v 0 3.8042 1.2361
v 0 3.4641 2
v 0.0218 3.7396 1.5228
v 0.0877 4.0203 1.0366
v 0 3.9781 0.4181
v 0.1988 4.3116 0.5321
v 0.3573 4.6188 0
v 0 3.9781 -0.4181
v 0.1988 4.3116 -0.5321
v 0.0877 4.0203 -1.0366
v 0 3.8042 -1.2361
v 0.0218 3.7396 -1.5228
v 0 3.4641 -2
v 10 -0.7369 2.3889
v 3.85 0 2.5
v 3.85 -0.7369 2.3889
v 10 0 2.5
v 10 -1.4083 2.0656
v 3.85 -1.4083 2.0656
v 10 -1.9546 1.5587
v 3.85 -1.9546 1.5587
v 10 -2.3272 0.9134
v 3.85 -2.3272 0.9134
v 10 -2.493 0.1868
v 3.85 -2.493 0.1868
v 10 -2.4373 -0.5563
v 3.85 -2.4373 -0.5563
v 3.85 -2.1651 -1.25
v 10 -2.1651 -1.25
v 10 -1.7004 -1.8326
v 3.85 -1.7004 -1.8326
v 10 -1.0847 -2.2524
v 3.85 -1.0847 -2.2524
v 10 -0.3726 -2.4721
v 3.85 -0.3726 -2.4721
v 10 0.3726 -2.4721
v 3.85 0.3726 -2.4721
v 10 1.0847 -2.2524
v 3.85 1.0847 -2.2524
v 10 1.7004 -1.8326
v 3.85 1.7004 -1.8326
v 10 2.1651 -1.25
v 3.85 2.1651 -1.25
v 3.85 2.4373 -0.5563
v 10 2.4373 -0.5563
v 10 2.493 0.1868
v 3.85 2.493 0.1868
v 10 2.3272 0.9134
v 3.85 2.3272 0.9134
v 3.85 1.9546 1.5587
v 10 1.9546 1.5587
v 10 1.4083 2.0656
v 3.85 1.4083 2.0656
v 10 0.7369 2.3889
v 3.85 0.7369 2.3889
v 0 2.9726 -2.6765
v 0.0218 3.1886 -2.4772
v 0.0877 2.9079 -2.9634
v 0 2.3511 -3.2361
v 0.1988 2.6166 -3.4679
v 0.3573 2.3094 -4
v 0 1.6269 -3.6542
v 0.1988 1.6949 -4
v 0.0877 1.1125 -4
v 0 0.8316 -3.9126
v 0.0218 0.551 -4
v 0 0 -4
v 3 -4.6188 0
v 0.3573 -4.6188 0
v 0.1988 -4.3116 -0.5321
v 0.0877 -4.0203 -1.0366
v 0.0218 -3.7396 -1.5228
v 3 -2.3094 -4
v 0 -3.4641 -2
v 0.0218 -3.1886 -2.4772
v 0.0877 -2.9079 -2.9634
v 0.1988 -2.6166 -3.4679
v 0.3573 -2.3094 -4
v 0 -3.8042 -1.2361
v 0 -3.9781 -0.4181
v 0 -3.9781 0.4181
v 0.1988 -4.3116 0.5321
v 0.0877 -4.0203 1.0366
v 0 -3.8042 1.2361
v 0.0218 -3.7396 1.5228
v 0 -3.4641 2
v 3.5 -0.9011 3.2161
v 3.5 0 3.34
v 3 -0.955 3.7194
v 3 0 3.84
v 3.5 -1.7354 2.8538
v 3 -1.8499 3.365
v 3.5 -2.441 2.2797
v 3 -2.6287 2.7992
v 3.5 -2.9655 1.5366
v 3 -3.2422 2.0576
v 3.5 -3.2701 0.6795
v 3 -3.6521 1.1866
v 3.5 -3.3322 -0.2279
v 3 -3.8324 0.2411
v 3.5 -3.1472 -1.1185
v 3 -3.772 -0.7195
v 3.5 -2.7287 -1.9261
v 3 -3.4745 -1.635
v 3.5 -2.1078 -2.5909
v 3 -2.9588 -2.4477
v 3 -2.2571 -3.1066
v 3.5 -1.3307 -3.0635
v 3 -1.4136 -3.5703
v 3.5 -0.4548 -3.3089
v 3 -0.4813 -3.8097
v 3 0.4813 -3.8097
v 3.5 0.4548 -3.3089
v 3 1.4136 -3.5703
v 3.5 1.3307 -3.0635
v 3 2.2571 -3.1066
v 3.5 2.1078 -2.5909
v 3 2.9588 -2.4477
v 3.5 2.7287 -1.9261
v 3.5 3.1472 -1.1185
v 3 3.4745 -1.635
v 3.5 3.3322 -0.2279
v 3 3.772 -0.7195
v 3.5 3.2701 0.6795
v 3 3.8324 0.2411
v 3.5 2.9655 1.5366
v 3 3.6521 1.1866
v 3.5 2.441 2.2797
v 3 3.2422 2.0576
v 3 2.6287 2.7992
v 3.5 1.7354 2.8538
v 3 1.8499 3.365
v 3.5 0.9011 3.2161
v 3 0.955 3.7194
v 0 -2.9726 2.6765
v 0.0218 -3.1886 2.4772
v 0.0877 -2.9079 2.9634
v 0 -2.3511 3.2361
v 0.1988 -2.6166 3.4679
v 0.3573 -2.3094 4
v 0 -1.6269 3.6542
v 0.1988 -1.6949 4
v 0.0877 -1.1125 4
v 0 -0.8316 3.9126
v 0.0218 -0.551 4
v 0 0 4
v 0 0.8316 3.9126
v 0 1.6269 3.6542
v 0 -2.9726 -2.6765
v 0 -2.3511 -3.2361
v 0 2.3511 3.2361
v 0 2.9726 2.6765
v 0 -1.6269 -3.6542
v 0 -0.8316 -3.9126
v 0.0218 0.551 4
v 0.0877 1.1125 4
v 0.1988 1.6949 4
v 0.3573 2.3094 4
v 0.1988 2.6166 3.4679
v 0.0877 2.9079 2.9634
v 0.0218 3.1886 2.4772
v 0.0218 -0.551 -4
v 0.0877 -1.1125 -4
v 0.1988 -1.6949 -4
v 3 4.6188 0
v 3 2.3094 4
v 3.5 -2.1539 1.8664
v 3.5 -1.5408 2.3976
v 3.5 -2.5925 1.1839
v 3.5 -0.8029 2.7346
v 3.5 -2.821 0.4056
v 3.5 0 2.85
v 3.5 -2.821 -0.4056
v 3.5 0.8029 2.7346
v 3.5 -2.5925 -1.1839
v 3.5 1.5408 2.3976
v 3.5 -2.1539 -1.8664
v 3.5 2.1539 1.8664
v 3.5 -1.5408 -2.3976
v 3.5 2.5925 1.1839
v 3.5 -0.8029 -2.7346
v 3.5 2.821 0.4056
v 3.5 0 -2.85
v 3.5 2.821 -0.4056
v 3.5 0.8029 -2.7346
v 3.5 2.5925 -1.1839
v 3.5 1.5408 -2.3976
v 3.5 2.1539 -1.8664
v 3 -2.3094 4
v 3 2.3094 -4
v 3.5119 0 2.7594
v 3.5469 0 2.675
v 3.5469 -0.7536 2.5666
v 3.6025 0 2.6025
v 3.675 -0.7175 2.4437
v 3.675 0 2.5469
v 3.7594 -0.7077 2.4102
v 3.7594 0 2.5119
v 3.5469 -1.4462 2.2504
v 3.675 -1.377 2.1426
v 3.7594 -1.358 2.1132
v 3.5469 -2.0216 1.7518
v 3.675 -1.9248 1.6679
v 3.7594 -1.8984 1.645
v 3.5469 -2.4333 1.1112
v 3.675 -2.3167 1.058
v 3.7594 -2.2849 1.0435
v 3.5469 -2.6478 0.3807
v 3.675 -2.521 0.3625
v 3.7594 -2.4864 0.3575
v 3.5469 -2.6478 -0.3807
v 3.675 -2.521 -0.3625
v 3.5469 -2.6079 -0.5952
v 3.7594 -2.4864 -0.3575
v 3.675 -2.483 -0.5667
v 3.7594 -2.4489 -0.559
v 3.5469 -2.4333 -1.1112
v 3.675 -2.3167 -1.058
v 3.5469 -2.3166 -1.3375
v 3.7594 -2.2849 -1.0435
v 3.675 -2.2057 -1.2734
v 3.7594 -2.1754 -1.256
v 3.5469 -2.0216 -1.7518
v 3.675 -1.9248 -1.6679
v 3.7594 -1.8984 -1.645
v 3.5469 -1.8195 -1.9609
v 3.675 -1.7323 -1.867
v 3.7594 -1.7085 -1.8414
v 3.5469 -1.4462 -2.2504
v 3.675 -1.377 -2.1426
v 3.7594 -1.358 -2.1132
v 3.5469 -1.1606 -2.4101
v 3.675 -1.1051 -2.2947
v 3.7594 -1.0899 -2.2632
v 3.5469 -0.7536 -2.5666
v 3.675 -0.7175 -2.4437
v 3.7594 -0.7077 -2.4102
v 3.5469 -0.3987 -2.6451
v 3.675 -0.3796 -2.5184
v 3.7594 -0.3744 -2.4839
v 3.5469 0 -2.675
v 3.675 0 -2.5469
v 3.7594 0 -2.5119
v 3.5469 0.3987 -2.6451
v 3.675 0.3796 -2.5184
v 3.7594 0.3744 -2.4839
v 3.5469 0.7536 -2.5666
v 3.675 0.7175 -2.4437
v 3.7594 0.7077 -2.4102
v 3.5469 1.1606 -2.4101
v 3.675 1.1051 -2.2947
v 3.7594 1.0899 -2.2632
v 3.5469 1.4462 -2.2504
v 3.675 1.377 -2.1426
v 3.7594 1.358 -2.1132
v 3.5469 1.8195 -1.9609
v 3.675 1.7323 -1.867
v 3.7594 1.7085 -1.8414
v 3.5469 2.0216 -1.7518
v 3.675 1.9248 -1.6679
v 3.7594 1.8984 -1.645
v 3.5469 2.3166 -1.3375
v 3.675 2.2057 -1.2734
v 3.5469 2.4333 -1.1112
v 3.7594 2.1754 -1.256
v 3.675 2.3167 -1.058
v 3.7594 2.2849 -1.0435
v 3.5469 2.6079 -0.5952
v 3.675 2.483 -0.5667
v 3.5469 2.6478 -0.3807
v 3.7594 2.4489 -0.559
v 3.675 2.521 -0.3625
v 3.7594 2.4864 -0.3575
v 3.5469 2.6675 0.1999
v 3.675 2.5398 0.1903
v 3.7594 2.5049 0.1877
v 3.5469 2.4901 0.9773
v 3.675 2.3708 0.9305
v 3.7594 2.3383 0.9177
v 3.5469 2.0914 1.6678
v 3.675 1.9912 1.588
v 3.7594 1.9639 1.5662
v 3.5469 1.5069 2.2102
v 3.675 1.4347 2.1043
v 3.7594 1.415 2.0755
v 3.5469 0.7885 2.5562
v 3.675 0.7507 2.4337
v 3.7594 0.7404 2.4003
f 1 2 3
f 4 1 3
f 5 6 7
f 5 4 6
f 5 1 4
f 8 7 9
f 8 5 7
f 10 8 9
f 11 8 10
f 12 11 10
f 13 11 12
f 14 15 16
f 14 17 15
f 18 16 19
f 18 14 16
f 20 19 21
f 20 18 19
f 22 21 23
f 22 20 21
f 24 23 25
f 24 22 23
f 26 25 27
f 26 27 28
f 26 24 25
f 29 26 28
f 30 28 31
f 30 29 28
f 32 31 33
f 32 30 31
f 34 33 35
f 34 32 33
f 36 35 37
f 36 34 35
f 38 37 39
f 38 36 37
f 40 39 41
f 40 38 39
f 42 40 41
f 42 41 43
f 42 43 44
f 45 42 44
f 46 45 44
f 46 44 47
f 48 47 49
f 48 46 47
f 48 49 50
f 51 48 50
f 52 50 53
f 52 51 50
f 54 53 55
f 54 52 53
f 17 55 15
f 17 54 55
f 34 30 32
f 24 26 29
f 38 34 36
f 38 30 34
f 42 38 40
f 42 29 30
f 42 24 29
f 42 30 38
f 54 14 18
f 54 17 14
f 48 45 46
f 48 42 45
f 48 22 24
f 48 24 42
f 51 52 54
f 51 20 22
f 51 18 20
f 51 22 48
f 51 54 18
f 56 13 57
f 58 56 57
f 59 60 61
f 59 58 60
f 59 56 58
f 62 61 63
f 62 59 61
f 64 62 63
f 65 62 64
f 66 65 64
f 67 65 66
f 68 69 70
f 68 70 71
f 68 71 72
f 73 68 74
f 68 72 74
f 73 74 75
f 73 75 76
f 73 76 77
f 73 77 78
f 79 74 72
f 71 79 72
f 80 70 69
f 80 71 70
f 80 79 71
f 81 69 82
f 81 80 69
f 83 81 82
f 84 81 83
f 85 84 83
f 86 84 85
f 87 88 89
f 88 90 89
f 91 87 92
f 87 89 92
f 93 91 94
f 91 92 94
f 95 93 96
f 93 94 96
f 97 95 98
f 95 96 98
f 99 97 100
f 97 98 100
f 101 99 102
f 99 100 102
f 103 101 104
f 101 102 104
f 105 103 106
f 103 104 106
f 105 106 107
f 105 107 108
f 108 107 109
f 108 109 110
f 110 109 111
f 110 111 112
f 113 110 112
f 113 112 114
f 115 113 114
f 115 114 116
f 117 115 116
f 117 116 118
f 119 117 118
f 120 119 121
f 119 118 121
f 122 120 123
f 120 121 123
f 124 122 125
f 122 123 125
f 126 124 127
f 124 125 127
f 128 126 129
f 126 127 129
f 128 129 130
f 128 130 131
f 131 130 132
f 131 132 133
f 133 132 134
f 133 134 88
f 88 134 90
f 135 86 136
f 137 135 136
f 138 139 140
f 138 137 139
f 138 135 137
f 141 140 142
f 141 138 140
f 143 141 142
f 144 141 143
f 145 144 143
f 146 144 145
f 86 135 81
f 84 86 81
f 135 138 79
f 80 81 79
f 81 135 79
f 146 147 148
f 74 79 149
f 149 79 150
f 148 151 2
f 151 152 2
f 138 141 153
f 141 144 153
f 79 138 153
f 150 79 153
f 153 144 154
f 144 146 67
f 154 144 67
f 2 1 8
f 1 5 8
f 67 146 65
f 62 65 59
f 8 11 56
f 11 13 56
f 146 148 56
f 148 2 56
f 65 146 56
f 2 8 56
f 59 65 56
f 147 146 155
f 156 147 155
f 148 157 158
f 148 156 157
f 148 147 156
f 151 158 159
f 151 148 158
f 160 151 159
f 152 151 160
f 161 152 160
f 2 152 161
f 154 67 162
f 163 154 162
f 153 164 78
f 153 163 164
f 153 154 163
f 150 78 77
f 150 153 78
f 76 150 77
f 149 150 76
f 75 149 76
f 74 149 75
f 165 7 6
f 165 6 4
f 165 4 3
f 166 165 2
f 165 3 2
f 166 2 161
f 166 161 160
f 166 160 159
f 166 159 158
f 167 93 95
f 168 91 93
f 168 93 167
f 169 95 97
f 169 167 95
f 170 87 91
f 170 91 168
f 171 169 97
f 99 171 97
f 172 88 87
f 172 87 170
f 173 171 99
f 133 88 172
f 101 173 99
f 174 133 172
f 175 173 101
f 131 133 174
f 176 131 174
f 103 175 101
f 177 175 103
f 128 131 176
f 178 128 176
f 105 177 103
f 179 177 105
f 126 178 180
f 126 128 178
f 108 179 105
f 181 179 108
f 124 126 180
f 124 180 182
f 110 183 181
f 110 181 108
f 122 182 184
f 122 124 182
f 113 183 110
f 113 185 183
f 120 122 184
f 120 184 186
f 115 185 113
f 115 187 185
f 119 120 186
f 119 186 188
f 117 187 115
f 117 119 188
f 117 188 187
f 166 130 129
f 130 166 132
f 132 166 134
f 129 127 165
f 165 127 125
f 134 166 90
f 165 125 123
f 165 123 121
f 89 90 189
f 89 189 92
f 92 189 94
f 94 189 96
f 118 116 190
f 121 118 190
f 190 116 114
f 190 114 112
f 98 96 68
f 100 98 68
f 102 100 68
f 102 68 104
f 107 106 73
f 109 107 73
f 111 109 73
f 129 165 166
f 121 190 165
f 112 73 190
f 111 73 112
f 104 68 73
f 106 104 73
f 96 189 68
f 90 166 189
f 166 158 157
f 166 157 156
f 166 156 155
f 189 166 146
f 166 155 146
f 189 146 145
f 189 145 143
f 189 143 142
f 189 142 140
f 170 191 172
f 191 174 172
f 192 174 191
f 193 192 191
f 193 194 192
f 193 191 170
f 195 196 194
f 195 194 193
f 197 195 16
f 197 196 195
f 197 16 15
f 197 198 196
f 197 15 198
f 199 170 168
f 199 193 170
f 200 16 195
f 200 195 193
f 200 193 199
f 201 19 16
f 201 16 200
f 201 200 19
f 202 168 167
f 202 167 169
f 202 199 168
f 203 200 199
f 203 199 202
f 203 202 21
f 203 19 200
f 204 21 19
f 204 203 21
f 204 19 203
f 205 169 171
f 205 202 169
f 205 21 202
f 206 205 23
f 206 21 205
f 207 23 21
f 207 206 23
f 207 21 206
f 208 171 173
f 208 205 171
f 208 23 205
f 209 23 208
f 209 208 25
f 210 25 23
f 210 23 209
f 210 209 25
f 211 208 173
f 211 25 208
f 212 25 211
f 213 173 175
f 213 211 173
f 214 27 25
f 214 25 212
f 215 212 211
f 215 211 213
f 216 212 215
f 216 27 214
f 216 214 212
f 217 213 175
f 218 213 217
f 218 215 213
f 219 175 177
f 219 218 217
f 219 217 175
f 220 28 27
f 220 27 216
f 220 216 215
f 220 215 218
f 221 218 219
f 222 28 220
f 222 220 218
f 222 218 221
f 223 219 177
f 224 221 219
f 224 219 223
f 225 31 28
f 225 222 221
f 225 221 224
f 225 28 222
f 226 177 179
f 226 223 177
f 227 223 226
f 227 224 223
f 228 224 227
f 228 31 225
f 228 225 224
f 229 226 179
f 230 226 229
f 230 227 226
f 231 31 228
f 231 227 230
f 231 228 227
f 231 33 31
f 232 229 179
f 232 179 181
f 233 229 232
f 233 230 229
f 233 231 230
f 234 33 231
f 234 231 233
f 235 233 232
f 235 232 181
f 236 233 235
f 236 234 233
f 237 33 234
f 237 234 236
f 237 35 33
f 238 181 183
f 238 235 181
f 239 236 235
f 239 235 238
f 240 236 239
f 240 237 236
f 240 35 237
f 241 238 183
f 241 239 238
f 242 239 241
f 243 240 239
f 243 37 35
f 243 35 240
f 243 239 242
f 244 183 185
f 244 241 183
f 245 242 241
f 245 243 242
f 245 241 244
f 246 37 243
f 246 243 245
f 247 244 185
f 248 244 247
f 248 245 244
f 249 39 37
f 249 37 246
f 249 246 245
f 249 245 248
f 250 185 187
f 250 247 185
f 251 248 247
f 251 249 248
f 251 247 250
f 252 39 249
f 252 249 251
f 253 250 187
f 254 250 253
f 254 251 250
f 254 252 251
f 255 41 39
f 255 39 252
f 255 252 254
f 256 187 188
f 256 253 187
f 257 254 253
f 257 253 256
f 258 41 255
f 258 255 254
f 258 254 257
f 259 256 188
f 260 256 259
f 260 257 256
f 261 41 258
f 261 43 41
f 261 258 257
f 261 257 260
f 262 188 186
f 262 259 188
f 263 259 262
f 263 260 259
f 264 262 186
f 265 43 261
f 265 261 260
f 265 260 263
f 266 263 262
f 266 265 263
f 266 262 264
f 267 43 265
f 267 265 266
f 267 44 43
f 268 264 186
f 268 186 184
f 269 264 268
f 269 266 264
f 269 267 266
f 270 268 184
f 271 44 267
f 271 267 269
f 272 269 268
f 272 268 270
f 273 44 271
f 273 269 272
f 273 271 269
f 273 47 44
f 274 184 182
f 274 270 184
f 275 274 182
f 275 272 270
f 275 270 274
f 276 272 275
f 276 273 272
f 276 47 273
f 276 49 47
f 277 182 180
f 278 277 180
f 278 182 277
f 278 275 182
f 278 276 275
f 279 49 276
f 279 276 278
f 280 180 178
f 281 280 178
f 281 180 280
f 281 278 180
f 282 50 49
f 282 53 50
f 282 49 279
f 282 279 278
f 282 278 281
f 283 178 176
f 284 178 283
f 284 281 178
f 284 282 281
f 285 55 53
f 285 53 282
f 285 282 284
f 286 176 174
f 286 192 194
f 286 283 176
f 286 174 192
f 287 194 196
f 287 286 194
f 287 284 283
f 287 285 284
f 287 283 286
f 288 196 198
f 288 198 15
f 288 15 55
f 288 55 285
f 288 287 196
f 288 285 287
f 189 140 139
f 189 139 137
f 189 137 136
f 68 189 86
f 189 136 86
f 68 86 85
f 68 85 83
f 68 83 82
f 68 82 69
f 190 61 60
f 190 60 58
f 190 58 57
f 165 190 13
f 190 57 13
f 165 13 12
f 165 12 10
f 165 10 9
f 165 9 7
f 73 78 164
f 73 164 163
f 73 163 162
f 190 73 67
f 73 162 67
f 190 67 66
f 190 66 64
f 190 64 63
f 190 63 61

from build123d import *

# Parameters (mm, degrees)
EXTRUDE_1_DEPTH     = 3.5
SKETCH_4_R          = 8.79
SKETCH_4_R_2        = 4
CUT_EXTRUDE_1_DEPTH = 0.4375
CUT_EXTRUDE_1_DRAFT = -60
CHAMFER_2_SIZE      = 0.277777778
SKETCH_9_W          = 7
SKETCH_9_H          = 5
CUT_EXTRUDE_2_DEPTH = 5


with BuildPart() as part:
    # 草图3 → 凸台-拉伸1 (new body)
    with BuildSketch(Plane(origin=(0, 0, 0), x_dir=(0, 0, -1), z_dir=(1, 0, 0))):
        Polygon((4, 2.309401077), (0, 4.618802154), (-4, 2.309401077), (-4, -2.309401077), (0, -4.618802154), (4, -2.309401077), align=None)
    extrude(amount=EXTRUDE_1_DEPTH)


with BuildPart() as cut_extrude_1_tool:
    # 草图4 → 切除-拉伸1 (with draft: the straight prism first)
    with BuildSketch(Plane.ZY):
        Circle(SKETCH_4_R)
        Circle(SKETCH_4_R_2, mode=Mode.SUBTRACT)
    extrude(amount=-CUT_EXTRUDE_1_DEPTH)
    # 切除-拉伸1: the draft: its side faces are tilted about the plane it starts from
    cut_extrude_1_sides = [cut_extrude_1_tool.faces().sort_by_distance(p)[0] for p in [
        (0.21875, 0, -8.79),
        (0.21875, 0, -4),
    ]]
    draft(cut_extrude_1_sides, Plane.ZY, CUT_EXTRUDE_1_DRAFT)


with BuildPart() as part_1:
    add(part.part)

    # 切除-拉伸1: cut by cut_extrude_1_tool
    add(cut_extrude_1_tool.part, mode=Mode.SUBTRACT)

    # 草图5 → 旋转1 (revolve)
    with BuildSketch(Plane.XY, mode=Mode.PRIVATE) as revolve_1_sk:
        with BuildLine():
            Line((3.85, 2.5), (13.5, 2.5))
            Line((13.5, 2.5), (13.5, 0))
            Line((13.5, 0), (3.5, 0))
            Line((3.5, 0), (3.5, 2.85))
            ThreePointArc((3.5, 2.85), (3.602512627, 2.602512627), (3.85, 2.5))
        make_face()
    revolve(revolve_1_sk.sketch.rotate(Axis((3.5, 0, 0), (1, 0, 0)), 90), axis=Axis((3.5, 0, 0), (1, 0, 0)))

    # 倒角2
    chamfer_2_edges = [part_1.edges().sort_by_distance(p)[0] for p in [
        (13.5, 0, -2.5),
    ]]
    chamfer(chamfer_2_edges, length=CHAMFER_2_SIZE)

    # 草图7 → 切除-旋转1 (revolve, cut)
    with BuildSketch(Plane.XY, mode=Mode.PRIVATE) as cut_revolve_1_sk:
        Polygon((3.5, 3.34), (3, 3.84), (3, 8.79), (3.5, 8.79), align=None)
    revolve(cut_revolve_1_sk.sketch.rotate(Axis((0, 0, 0), (1, 0, 0)), 90), axis=Axis((0, 0, 0), (1, 0, 0)), mode=Mode.SUBTRACT)

    # 草图9 → 切除-拉伸2 (cut, symmetric)
    with BuildSketch(Plane.XY):
        with Locations((13.5, 0)):
            Rectangle(SKETCH_9_W, SKETCH_9_H)
    extrude(amount=CUT_EXTRUDE_2_DEPTH, both=True, mode=Mode.SUBTRACT)


solid = part_1.part
